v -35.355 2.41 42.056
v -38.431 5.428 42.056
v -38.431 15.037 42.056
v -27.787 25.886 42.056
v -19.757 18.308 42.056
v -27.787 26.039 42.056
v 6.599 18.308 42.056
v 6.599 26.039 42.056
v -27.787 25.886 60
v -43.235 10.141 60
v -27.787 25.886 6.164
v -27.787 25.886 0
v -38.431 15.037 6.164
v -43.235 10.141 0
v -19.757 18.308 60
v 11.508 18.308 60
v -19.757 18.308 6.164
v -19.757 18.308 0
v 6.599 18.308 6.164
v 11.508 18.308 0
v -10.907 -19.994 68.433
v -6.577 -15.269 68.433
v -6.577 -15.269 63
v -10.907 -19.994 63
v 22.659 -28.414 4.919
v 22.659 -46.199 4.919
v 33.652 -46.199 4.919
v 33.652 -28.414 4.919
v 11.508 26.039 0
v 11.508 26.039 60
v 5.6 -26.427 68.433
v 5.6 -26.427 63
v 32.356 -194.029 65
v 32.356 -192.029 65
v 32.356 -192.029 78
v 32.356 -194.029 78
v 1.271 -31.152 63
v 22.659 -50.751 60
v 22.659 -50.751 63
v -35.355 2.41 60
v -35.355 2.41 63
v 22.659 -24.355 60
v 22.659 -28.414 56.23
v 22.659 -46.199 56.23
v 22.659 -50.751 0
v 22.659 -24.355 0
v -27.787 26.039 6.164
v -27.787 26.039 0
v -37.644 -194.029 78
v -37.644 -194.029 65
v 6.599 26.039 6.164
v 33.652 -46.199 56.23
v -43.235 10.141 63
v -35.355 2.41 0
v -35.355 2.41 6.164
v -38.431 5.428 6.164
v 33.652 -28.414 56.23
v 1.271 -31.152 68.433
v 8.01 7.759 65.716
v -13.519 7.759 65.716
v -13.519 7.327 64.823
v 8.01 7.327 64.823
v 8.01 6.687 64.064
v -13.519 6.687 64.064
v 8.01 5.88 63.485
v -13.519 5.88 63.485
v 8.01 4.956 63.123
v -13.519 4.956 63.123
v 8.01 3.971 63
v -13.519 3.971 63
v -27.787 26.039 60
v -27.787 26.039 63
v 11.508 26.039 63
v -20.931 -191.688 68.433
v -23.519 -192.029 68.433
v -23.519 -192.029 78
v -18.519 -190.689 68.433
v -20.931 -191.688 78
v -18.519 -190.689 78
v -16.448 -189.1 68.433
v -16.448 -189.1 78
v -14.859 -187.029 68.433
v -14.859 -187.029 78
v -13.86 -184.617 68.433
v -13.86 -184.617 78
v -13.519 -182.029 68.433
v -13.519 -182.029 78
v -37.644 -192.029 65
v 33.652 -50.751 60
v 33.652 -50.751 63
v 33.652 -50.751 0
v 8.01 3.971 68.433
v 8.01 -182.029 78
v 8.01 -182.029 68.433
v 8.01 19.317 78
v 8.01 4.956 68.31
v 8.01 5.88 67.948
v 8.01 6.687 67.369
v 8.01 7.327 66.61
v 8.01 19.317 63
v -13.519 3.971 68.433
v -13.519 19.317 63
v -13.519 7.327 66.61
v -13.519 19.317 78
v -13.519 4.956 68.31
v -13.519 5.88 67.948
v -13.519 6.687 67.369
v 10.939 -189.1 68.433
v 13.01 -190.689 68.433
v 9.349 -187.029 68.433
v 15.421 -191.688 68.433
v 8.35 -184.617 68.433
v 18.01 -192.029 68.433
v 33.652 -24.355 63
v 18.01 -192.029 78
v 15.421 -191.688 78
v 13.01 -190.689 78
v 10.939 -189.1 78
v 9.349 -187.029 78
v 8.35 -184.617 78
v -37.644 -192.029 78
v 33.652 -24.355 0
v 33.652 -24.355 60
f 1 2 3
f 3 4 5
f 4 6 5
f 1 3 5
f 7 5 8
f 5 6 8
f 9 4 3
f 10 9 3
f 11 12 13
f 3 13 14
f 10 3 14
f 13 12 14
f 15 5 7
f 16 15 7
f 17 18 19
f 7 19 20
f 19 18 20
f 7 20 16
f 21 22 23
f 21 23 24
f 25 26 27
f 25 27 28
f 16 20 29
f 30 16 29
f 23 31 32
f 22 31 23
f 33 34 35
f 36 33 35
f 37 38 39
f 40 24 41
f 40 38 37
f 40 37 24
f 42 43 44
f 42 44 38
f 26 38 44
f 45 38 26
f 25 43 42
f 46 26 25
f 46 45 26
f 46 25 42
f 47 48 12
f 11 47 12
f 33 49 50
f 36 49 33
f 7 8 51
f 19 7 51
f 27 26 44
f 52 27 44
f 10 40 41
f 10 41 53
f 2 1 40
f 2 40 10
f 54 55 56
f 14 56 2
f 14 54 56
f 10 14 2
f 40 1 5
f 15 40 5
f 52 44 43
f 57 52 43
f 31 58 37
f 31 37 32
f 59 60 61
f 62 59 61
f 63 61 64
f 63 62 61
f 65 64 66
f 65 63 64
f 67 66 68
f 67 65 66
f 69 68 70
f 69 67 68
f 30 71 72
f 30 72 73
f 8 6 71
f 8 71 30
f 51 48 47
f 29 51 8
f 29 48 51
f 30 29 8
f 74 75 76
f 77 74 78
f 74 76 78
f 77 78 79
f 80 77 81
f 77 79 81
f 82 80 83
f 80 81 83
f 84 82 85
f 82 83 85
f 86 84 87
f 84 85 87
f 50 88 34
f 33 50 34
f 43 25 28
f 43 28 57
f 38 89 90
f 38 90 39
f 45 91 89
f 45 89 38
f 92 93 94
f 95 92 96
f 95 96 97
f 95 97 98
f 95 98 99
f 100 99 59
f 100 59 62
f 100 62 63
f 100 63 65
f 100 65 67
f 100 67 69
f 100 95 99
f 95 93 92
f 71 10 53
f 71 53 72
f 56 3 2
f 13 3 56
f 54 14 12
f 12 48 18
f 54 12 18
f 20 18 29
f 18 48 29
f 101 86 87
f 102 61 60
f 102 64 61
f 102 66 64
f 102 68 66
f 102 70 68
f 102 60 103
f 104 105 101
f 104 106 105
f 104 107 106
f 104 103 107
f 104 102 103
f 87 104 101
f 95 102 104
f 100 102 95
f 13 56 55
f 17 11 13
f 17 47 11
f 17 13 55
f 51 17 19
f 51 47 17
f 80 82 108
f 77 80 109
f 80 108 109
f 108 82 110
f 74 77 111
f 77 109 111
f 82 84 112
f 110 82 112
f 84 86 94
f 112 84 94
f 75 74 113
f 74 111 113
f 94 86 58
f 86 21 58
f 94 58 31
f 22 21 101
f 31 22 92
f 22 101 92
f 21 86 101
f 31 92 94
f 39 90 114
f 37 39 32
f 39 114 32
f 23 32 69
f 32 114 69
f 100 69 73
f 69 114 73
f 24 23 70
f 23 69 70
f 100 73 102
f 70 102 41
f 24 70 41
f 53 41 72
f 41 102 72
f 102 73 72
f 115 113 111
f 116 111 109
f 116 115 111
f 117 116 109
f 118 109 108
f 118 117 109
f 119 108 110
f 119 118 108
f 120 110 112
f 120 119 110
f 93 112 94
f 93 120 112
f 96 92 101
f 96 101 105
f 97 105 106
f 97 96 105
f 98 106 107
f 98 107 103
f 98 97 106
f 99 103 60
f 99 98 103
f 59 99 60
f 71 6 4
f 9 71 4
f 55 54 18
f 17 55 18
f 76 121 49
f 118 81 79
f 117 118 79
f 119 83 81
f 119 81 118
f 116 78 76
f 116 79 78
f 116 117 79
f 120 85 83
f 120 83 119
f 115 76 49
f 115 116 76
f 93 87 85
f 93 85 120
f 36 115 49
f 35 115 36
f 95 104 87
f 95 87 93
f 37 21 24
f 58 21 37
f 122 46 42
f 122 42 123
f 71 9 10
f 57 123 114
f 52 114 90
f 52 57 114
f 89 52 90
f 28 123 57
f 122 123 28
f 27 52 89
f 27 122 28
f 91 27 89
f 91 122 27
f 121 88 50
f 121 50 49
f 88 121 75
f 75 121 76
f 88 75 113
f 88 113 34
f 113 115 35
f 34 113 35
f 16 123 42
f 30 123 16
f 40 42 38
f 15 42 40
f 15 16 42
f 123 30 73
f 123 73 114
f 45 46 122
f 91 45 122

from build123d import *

# Parameters (mm, degrees)
BOSS_EXTRUDE1_DEPTH   = 60
SKETCH1_W             = 10.993820537
SKETCH1_H             = 26.396502677
BOSS_EXTRUDE1_2_DEPTH = 60
BOSS_EXTRUDE2_DEPTH   = 3
SKETCH3_W             = 21.528788888
SKETCH3_H             = 11.346253603
BOSS_EXTRUDE3_DEPTH   = 15
SKETCH4_W             = 21.528788888
SKETCH4_H             = 9.567300702
BOSS_EXTRUDE4_DEPTH   = 200
SKETCH5_W             = 51.310621716
SKETCH5_H             = 17.784956531
CUT_EXTRUDE1_DEPTH    = 200
SKETCH6_W             = 45.030110597
SKETCH6_H             = 35.891646976
CUT_EXTRUDE2_DEPTH    = 200
SKETCH7_W             = 70
SKETCH7_H             = 13
BOSS_EXTRUDE5_DEPTH   = 2
FILLET1_R             = 10
FILLET3_R             = 4
BOSS_EXTRUDE6_DEPTH   = 7


with BuildPart() as part:
    # Sketch1 → Boss-Extrude1 (new body)
    with BuildSketch(Plane.XY):
        Polygon((-19.757378597, 18.307693349), (11.507697245, 18.307693349), (11.507697245, 26.038756838), (-27.787096512, 26.038756838), (-27.787096512, 25.885892475), (-43.235049783, 10.14086318), (-35.355311996, 2.409799691), align=None)
    extrude(amount=BOSS_EXTRUDE1_DEPTH)



with BuildPart() as body_2:
    # Sketch1 → Boss-Extrude1 2 (new body)
    with BuildSketch(Plane.XY):
        with Locations((28.155491547, -37.552817793)):
            Rectangle(SKETCH1_W, SKETCH1_H)
    extrude(amount=BOSS_EXTRUDE1_2_DEPTH)


with BuildPart() as part_1:
    add(part.part)

    add(body_2.part)  # Boss-Extrude2 merges body 2
    # Sketch2 → Boss-Extrude2 (add)
    with BuildSketch(Plane.XY.offset(60)):
        Polygon((-43.235049783, 10.14086318), (-27.787096512, 26.038756838), (11.507697245, 26.038756838), (33.652401815, -24.354566454), (33.652401815, -50.751069131), (22.658581278, -50.751069131), (-35.355311996, 2.409799691), align=None)
    extrude(amount=BOSS_EXTRUDE2_DEPTH)

    # Sketch3 → Boss-Extrude3 (add)
    with BuildSketch(Plane.XY.offset(63)):
        with Locations((-2.754816927, 13.64397724)):
            Rectangle(SKETCH3_W, SKETCH3_H)
    extrude(amount=BOSS_EXTRUDE3_DEPTH)

    # Sketch4 → Boss-Extrude4 (add)
    with BuildSketch(Plane.XZ.offset(-7.970850439)):
        with Locations((-2.754816927, 73.216349649)):
            Rectangle(SKETCH4_W, SKETCH4_H)
    extrude(amount=BOSS_EXTRUDE4_DEPTH)

    # Sketch5 → Cut-Extrude1 (cut)
    with BuildSketch(Plane.ZY.offset(-22.658581278)):
        with Locations((30.574482512, -37.306256307)):
            Rectangle(SKETCH5_W, SKETCH5_H)
    extrude(amount=-CUT_EXTRUDE1_DEPTH, mode=Mode.SUBTRACT)

    # Sketch6 → Cut-Extrude2 (cut)
    with BuildSketch(Plane(origin=(0, 26.038756838, 0), x_dir=(1, 0, 0), z_dir=(0, 1, 0))):
        with Locations((-15.916410132, -24.110147888)):
            Rectangle(SKETCH6_W, SKETCH6_H)
    extrude(amount=-CUT_EXTRUDE2_DEPTH, mode=Mode.SUBTRACT)

    # Sketch7 → Boss-Extrude5 (add)
    with BuildSketch(Plane.XZ.offset(192.029149561)):
        with Locations((-2.644159555, 71.5)):
            Rectangle(SKETCH7_W, SKETCH7_H)
    extrude(amount=BOSS_EXTRUDE5_DEPTH)

    # Fillet1
    fillet1_edges = [part_1.edges().sort_by_distance(p)[0] for p in [
        (-13.519211371, -192.029149561, 73.216349649),
        (8.009577517, -192.029149561, 73.216349649),
    ]]
    fillet(fillet1_edges, radius=FILLET1_R)

    # Fillet3
    # the kernel refuses this fillet: 4 mm, written as the material it adds along each edge
    with BuildSketch(Plane(origin=(8.009577517, 7.970850439, 63), x_dir=(0, 0, 1), z_dir=(-1, 0, 0)), Plane(origin=(8.009577517, 7.970850439, 68.432699298), x_dir=(0, -1, 0), z_dir=(-1, 0, 0))) as fillet3_piece_1:
        with BuildLine():
            CenterArc((FILLET3_R, -FILLET3_R), FILLET3_R, 90, 90)
            Line((0, -FILLET3_R), (0, 0))
            Line((0, 0), (FILLET3_R, 0))
        make_face()
    extrude(amount=21.528788888)

    # Sketch8 → Boss-Extrude6 (add)
    with BuildSketch(Plane(origin=(0, 0, 68.432699298), x_dir=(-1, 0, 0), z_dir=(0, 0, -1))):
        Polygon((10.906624275, -19.993686913), (-1.270597079, -31.152249638), (-5.600185218, -26.427415943), (6.577036136, -15.268853218), align=None)
    extrude(amount=BOSS_EXTRUDE6_DEPTH)


solid = part_1.part
